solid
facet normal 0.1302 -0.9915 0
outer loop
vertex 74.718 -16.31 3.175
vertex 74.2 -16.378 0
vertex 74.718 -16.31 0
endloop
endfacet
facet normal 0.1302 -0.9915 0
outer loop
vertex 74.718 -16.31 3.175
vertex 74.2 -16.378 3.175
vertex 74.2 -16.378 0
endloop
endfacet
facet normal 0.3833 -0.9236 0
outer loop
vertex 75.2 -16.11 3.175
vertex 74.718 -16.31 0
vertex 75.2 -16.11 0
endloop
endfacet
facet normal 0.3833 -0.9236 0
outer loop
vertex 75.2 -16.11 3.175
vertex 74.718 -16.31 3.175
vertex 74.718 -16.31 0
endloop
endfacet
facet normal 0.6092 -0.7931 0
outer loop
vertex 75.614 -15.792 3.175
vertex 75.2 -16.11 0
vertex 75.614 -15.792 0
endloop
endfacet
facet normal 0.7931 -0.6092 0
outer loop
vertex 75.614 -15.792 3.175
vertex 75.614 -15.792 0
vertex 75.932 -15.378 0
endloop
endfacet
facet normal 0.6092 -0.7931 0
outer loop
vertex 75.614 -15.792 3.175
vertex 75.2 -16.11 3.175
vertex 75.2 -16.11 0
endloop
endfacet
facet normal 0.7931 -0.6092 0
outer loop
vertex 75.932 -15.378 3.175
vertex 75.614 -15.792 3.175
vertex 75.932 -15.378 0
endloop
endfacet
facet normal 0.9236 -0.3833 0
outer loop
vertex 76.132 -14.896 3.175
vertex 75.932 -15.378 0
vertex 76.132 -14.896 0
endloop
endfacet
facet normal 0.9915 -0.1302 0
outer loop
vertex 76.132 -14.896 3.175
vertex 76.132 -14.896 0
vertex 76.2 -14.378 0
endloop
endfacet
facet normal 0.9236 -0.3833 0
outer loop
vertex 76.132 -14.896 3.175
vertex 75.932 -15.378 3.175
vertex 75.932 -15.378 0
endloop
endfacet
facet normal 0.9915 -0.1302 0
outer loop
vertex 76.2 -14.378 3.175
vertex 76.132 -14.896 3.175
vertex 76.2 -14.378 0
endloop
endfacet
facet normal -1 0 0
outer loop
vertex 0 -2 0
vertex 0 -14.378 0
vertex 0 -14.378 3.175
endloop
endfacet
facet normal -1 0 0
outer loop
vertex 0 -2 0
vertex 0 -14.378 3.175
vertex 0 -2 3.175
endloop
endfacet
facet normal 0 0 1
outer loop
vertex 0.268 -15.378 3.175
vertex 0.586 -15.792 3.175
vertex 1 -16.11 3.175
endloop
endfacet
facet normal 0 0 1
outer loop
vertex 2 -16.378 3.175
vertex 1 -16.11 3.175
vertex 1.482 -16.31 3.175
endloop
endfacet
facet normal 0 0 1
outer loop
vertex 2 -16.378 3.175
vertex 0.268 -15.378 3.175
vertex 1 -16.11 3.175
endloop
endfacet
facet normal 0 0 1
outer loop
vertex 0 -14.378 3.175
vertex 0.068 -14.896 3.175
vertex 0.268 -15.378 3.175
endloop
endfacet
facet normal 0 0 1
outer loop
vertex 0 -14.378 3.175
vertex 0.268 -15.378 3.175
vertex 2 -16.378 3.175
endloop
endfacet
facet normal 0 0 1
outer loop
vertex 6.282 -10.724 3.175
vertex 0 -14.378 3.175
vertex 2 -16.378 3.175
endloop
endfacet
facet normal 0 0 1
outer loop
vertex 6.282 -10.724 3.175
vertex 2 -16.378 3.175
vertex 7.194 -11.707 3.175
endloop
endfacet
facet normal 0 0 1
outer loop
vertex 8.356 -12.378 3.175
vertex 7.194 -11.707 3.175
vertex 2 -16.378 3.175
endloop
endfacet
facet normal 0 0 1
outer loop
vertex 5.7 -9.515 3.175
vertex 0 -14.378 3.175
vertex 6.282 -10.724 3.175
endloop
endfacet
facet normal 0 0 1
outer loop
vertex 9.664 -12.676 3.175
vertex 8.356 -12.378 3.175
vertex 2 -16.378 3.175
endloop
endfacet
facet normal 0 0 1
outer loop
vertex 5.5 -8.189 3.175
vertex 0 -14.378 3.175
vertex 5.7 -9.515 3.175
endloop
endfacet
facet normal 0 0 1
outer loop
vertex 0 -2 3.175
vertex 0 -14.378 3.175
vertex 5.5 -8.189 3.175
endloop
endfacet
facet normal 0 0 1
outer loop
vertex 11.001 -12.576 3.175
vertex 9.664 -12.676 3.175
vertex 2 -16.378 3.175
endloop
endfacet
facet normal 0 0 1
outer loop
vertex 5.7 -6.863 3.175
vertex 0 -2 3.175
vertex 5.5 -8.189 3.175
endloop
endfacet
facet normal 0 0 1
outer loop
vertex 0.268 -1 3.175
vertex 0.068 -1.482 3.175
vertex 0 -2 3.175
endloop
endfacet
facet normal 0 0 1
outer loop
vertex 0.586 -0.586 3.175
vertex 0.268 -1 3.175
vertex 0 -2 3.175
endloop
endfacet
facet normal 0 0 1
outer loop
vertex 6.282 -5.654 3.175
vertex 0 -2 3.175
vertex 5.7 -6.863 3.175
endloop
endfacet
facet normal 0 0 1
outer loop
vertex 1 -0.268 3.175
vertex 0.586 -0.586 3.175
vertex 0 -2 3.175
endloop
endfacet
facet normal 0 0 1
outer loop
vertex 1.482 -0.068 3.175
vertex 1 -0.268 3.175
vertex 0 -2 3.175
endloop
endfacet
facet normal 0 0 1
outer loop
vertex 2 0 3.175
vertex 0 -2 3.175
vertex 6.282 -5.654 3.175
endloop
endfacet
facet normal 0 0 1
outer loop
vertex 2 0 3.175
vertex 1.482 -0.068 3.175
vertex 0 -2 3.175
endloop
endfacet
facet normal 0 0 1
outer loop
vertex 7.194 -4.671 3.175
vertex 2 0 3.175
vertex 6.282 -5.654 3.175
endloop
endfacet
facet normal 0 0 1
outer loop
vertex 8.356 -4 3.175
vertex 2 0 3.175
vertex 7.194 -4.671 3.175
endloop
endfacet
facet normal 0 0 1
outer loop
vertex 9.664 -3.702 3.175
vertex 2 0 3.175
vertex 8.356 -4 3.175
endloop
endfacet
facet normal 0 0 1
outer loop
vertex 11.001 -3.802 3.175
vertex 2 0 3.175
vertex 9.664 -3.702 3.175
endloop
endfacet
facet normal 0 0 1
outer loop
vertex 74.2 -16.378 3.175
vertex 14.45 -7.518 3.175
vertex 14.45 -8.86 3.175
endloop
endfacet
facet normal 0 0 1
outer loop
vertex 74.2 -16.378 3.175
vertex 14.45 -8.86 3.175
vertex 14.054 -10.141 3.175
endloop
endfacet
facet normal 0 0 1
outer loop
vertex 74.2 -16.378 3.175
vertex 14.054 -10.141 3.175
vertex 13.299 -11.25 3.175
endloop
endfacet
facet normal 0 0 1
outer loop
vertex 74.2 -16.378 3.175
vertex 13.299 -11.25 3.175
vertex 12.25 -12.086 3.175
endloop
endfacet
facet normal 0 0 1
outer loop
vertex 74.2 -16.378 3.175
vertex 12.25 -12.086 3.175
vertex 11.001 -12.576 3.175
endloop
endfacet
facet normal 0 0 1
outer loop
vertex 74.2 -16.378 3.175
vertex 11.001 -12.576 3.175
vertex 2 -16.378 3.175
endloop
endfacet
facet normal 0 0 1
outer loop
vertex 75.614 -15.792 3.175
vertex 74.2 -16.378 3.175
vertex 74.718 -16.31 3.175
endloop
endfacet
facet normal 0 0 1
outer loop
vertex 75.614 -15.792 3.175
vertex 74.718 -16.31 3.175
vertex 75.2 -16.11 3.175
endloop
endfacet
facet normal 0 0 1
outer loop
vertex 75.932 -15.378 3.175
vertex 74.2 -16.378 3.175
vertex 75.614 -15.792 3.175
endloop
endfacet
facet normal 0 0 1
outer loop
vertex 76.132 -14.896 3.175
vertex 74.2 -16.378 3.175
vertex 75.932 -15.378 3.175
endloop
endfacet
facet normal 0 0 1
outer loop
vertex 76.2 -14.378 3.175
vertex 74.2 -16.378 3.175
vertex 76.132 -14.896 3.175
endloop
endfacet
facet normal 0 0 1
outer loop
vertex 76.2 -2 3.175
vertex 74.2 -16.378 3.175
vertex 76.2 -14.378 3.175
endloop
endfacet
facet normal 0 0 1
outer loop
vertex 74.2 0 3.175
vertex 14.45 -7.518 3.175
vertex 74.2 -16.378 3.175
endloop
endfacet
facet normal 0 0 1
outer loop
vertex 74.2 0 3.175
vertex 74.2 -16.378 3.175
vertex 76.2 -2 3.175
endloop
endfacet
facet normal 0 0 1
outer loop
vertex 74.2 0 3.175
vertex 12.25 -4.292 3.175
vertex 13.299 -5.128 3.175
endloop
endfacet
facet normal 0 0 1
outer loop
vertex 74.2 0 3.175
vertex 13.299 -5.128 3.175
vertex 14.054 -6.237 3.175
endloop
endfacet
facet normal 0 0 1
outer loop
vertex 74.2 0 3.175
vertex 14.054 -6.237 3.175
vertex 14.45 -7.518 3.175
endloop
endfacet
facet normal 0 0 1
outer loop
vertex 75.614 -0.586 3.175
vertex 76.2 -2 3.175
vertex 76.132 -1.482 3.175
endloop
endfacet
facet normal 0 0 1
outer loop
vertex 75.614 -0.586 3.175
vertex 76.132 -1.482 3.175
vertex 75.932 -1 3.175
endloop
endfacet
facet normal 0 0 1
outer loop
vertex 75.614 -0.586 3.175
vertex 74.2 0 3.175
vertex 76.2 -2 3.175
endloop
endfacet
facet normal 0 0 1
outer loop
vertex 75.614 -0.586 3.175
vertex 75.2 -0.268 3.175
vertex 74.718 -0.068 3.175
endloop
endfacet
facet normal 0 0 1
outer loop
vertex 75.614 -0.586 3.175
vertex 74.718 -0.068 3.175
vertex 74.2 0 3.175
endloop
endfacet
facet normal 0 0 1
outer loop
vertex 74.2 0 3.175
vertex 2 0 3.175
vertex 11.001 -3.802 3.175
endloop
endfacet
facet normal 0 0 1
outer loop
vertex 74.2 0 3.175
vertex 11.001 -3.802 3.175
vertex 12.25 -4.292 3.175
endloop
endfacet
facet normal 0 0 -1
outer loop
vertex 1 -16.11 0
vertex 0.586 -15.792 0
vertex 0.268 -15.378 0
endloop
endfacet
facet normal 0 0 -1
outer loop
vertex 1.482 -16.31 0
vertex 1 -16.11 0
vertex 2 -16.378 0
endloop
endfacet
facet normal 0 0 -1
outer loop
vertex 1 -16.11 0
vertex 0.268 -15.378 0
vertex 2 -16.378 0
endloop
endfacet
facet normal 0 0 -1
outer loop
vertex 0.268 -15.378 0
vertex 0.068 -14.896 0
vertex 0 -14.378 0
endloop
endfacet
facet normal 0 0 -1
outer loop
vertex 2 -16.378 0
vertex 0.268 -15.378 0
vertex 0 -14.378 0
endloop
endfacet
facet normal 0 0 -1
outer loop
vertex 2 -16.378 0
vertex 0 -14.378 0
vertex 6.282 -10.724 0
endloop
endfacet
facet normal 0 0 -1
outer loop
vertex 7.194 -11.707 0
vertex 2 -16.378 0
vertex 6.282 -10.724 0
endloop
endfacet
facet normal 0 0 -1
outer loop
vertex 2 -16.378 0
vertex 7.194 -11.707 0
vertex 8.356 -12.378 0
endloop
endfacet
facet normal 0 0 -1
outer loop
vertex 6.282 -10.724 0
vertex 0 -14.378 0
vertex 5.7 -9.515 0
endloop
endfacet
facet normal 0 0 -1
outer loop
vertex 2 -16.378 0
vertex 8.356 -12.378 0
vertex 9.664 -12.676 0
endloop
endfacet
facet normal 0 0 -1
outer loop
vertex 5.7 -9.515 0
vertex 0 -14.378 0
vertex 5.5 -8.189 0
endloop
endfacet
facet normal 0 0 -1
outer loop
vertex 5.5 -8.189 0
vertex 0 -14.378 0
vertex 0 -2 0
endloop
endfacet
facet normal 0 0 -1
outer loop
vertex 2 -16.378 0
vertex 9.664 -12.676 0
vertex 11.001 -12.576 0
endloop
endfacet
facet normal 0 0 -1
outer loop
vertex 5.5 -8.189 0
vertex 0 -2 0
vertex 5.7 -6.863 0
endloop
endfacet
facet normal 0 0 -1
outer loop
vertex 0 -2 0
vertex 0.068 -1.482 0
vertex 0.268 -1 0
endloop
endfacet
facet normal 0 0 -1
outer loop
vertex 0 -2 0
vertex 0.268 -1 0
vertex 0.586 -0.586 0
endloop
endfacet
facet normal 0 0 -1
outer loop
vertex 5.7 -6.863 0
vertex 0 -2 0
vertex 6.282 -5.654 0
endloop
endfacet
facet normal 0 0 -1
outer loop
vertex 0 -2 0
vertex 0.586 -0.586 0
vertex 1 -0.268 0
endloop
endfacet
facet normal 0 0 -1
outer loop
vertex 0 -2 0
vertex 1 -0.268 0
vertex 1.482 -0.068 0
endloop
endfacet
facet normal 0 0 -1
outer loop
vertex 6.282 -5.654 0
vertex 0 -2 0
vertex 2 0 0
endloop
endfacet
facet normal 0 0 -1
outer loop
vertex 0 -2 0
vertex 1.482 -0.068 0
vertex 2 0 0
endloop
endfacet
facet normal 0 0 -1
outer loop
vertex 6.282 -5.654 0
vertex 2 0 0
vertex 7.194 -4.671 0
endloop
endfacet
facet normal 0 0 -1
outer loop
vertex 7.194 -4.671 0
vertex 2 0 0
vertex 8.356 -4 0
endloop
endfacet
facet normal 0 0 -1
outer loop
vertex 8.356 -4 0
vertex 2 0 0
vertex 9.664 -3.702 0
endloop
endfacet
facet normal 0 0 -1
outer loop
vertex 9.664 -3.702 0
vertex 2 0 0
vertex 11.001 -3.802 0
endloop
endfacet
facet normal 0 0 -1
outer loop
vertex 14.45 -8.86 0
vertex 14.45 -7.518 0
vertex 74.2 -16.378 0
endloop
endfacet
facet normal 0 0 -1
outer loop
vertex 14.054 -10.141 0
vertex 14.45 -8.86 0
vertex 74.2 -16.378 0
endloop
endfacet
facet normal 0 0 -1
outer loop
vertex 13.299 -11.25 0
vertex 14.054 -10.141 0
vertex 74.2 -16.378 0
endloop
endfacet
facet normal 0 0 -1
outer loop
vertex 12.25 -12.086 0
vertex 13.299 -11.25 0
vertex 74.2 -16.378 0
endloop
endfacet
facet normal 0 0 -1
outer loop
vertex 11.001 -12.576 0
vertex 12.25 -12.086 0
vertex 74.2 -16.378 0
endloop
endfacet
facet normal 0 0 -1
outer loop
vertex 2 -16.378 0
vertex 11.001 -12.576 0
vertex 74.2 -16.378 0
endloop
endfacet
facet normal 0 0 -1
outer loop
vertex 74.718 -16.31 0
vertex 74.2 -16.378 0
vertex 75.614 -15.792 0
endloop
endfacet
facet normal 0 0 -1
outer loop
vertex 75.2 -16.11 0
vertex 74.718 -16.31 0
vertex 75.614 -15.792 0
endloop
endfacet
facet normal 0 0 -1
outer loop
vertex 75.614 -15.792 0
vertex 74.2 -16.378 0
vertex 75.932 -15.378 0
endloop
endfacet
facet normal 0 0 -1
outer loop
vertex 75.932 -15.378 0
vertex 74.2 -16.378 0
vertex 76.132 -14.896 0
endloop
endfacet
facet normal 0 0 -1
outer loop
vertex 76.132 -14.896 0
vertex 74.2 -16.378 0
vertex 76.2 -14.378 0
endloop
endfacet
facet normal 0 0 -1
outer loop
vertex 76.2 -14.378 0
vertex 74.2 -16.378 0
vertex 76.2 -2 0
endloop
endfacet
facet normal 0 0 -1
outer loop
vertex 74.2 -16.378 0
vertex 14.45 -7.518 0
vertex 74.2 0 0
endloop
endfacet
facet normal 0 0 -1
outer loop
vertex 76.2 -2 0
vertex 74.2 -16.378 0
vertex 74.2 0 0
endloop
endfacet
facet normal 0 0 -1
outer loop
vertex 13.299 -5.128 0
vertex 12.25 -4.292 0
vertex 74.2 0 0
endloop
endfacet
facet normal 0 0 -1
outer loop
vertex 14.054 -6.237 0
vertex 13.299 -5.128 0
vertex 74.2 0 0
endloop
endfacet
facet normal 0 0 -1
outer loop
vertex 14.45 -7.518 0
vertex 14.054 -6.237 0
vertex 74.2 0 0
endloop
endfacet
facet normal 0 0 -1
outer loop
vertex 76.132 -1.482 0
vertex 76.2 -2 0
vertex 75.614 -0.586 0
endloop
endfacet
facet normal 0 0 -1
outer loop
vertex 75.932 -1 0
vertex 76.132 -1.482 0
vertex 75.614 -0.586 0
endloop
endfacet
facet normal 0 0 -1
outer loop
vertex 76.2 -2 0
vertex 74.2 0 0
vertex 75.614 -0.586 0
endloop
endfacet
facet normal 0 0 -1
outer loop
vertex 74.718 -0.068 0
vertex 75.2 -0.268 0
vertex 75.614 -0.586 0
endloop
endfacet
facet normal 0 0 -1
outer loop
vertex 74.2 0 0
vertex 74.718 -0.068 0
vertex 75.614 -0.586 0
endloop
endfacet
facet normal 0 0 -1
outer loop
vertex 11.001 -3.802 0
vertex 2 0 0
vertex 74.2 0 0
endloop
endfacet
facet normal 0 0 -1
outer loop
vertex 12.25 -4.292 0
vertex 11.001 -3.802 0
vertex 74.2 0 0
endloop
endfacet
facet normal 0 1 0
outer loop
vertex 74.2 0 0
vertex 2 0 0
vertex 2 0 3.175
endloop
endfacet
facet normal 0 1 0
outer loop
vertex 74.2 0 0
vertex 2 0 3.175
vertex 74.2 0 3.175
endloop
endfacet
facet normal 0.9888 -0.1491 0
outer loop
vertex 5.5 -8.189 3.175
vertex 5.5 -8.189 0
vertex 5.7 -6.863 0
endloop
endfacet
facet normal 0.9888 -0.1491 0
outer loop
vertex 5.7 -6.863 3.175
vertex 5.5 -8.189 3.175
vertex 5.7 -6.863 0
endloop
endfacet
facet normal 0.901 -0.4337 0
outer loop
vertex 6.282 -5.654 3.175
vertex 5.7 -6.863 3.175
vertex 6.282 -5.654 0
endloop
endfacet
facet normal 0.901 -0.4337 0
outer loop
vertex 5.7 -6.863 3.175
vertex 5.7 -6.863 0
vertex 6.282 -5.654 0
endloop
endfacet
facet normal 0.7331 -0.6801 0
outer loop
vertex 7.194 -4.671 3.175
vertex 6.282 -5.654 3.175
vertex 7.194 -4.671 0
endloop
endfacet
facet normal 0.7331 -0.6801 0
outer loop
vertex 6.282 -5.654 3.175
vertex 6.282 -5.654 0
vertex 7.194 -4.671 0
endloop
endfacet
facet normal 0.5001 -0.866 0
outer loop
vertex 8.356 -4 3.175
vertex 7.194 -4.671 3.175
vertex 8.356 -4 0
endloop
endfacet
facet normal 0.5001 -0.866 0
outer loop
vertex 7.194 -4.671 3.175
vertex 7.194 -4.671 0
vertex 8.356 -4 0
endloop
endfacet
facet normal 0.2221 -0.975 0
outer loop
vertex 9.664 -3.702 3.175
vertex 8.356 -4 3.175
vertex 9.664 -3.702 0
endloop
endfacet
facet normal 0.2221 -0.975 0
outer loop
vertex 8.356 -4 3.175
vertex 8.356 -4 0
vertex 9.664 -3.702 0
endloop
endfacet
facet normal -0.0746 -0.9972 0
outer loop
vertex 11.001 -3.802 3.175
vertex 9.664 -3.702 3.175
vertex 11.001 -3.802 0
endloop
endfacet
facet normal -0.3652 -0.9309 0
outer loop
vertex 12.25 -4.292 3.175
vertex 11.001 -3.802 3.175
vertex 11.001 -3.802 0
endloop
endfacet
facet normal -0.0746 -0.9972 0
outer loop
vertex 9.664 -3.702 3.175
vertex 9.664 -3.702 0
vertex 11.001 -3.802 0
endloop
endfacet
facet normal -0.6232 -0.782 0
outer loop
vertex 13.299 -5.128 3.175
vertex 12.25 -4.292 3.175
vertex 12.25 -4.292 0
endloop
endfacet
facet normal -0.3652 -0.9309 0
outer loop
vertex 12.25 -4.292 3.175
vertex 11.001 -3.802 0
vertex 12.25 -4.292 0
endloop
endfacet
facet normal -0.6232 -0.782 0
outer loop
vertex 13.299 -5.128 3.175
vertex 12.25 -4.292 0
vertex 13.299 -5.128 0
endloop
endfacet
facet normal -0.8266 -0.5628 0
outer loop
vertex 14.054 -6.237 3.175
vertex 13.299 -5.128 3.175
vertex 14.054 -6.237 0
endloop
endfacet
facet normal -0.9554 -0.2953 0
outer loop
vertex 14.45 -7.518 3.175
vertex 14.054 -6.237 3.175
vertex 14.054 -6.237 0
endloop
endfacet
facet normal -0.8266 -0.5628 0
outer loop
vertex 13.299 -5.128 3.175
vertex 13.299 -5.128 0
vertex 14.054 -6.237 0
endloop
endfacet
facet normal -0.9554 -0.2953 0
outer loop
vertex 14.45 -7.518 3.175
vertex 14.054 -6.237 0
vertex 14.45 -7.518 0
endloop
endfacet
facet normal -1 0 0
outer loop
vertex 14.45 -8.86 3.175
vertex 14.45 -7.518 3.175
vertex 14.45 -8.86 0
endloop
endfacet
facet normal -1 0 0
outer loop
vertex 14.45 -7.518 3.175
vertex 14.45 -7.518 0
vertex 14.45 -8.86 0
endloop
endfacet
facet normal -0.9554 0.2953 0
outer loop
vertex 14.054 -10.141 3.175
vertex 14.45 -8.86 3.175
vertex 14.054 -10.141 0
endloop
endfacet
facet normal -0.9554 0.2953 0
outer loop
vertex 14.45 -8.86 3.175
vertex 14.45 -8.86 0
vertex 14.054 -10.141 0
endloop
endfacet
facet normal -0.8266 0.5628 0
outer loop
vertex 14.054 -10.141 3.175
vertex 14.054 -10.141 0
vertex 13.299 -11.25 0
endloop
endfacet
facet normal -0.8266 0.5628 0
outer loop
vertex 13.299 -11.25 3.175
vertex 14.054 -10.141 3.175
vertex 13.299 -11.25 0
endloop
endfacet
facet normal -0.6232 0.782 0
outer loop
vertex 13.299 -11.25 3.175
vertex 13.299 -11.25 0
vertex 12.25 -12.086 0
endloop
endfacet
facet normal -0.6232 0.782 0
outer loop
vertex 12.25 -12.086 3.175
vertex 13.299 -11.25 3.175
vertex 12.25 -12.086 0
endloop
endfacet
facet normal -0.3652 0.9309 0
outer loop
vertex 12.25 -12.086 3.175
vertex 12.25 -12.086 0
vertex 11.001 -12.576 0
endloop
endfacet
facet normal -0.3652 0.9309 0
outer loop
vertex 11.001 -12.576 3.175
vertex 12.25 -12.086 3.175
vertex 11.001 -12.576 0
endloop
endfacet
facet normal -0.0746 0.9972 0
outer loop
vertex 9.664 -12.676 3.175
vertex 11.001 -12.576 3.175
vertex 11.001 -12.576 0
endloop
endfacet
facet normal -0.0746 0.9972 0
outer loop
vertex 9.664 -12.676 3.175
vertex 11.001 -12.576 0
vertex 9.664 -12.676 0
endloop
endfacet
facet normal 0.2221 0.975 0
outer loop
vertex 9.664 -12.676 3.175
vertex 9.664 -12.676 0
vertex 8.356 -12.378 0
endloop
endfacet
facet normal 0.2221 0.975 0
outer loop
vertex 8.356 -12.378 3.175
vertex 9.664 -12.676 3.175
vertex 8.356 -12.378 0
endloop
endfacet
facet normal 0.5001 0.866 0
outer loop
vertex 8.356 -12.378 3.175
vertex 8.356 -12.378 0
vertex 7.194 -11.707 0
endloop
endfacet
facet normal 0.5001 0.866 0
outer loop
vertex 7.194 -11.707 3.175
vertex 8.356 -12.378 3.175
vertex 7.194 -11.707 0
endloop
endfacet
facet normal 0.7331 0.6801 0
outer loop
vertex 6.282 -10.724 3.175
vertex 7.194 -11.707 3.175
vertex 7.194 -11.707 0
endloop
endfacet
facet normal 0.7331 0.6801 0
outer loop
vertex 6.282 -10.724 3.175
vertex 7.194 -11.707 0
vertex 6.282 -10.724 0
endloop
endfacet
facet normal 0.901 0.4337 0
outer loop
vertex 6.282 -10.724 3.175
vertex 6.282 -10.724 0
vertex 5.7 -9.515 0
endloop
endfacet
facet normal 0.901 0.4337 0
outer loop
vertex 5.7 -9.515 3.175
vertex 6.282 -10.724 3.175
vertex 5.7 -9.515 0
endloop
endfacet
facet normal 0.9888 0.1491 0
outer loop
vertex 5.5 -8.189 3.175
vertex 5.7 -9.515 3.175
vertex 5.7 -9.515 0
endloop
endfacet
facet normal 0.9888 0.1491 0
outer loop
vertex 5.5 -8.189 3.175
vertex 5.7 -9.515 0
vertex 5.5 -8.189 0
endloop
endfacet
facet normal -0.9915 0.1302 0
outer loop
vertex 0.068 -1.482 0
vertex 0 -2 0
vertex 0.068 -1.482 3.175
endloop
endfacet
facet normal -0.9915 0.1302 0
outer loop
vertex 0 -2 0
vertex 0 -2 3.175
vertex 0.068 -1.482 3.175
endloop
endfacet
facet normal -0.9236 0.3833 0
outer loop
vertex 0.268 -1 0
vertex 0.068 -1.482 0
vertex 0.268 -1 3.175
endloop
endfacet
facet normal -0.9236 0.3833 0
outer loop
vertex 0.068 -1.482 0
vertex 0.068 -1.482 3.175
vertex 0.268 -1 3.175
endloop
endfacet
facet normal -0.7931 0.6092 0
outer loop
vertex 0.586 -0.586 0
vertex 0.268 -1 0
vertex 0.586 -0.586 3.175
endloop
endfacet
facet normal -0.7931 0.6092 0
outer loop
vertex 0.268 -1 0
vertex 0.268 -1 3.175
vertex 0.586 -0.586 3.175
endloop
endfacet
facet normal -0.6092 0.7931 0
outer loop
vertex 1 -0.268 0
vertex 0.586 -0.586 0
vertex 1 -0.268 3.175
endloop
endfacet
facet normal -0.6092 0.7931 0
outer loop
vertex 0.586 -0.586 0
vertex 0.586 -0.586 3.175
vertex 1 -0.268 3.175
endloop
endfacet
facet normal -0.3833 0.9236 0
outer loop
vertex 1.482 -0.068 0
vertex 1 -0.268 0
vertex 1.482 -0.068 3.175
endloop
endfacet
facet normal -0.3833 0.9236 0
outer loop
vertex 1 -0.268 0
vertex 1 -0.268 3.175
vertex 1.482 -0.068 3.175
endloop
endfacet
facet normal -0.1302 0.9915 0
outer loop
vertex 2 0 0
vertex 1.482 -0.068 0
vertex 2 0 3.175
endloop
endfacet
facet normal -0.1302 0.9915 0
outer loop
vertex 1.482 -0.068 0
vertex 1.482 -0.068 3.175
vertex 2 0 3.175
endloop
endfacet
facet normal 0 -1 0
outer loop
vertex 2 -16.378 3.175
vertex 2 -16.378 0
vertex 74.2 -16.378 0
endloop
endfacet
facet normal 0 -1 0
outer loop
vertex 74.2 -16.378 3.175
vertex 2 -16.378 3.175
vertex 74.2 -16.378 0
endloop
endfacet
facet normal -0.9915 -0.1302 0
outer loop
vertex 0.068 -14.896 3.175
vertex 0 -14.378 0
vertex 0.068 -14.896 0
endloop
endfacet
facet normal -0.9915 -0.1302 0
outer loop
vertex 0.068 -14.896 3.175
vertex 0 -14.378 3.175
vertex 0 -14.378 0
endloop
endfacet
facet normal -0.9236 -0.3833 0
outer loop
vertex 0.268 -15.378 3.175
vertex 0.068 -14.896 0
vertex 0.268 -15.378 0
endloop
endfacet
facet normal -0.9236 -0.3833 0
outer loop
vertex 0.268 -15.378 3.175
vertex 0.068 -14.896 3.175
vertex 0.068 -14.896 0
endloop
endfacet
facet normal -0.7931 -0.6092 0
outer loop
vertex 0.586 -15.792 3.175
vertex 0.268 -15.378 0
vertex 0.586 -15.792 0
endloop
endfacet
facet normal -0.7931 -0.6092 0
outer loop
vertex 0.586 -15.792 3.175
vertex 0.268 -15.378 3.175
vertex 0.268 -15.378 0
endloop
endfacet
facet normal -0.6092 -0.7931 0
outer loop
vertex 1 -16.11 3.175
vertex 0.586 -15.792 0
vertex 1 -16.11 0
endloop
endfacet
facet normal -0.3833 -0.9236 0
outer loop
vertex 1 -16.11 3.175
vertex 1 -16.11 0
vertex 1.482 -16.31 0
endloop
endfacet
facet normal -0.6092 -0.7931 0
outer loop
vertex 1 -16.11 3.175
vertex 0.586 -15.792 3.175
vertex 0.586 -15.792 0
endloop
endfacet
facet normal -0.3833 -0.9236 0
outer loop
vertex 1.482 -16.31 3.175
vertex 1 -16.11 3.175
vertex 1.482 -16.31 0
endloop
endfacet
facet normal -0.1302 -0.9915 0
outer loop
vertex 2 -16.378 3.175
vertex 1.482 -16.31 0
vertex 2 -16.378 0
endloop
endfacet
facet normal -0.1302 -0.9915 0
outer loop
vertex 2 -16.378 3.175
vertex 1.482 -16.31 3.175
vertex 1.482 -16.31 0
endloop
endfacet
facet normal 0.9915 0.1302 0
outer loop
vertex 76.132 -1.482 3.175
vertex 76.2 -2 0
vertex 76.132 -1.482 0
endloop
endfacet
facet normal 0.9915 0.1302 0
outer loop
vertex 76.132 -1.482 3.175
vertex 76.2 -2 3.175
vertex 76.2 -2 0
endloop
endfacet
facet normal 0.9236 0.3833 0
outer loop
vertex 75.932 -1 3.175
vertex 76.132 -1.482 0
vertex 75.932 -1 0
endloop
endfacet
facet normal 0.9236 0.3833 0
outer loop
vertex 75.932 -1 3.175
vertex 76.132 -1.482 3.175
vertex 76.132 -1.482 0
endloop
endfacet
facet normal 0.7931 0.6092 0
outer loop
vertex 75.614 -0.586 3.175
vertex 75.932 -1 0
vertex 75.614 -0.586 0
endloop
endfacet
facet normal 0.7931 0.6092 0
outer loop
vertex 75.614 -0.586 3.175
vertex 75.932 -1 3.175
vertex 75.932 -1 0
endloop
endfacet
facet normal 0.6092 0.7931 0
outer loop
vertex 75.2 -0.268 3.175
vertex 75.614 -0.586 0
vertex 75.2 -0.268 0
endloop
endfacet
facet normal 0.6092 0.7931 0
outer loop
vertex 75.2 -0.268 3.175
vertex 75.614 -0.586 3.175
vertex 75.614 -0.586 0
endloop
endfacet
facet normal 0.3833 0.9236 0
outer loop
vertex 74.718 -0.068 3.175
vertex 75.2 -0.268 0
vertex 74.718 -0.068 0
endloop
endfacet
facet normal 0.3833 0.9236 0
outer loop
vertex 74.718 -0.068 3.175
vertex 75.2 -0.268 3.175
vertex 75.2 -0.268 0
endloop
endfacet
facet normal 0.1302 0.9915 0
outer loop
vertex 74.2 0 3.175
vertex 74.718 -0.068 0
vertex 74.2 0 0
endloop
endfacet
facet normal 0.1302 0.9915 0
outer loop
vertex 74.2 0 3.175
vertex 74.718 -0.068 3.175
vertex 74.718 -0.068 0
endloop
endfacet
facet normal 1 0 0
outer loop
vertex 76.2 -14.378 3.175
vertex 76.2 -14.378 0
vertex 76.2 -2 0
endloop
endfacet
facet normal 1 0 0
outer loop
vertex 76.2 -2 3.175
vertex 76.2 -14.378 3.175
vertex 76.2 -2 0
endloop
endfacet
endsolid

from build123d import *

# Parameters (mm, degrees)
SKETCH1_W            = 76.2
SKETCH1_H            = 16.378
BOSS_EXTRUDE1_DEPTH  = 3.175
FILLET1_R            = 2
M8_CLEARANCE_HOLE1_D = 9


with BuildPart() as part:
    # Sketch1 → Boss-Extrude1 (new body)
    with BuildSketch(Plane.XY):
        with Locations((38.1, -8.189)):
            Rectangle(SKETCH1_W, SKETCH1_H)
    extrude(amount=BOSS_EXTRUDE1_DEPTH)

    # Fillet1
    fillet1_edges = [part.edges().sort_by_distance(p)[0] for p in [
        (0, 0, 1.5875),
        (76.2, 0, 1.5875),
        (76.2, -16.378, 1.5875),
        (0, -16.378, 1.5875),
    ]]
    fillet(fillet1_edges, radius=FILLET1_R)

    # M8 Clearance Hole1 (through all)
    with Locations(Plane.XY.offset(3.175)):
        with Locations((10, -8.189)):
            Hole(M8_CLEARANCE_HOLE1_D / 2)


solid = part.part
